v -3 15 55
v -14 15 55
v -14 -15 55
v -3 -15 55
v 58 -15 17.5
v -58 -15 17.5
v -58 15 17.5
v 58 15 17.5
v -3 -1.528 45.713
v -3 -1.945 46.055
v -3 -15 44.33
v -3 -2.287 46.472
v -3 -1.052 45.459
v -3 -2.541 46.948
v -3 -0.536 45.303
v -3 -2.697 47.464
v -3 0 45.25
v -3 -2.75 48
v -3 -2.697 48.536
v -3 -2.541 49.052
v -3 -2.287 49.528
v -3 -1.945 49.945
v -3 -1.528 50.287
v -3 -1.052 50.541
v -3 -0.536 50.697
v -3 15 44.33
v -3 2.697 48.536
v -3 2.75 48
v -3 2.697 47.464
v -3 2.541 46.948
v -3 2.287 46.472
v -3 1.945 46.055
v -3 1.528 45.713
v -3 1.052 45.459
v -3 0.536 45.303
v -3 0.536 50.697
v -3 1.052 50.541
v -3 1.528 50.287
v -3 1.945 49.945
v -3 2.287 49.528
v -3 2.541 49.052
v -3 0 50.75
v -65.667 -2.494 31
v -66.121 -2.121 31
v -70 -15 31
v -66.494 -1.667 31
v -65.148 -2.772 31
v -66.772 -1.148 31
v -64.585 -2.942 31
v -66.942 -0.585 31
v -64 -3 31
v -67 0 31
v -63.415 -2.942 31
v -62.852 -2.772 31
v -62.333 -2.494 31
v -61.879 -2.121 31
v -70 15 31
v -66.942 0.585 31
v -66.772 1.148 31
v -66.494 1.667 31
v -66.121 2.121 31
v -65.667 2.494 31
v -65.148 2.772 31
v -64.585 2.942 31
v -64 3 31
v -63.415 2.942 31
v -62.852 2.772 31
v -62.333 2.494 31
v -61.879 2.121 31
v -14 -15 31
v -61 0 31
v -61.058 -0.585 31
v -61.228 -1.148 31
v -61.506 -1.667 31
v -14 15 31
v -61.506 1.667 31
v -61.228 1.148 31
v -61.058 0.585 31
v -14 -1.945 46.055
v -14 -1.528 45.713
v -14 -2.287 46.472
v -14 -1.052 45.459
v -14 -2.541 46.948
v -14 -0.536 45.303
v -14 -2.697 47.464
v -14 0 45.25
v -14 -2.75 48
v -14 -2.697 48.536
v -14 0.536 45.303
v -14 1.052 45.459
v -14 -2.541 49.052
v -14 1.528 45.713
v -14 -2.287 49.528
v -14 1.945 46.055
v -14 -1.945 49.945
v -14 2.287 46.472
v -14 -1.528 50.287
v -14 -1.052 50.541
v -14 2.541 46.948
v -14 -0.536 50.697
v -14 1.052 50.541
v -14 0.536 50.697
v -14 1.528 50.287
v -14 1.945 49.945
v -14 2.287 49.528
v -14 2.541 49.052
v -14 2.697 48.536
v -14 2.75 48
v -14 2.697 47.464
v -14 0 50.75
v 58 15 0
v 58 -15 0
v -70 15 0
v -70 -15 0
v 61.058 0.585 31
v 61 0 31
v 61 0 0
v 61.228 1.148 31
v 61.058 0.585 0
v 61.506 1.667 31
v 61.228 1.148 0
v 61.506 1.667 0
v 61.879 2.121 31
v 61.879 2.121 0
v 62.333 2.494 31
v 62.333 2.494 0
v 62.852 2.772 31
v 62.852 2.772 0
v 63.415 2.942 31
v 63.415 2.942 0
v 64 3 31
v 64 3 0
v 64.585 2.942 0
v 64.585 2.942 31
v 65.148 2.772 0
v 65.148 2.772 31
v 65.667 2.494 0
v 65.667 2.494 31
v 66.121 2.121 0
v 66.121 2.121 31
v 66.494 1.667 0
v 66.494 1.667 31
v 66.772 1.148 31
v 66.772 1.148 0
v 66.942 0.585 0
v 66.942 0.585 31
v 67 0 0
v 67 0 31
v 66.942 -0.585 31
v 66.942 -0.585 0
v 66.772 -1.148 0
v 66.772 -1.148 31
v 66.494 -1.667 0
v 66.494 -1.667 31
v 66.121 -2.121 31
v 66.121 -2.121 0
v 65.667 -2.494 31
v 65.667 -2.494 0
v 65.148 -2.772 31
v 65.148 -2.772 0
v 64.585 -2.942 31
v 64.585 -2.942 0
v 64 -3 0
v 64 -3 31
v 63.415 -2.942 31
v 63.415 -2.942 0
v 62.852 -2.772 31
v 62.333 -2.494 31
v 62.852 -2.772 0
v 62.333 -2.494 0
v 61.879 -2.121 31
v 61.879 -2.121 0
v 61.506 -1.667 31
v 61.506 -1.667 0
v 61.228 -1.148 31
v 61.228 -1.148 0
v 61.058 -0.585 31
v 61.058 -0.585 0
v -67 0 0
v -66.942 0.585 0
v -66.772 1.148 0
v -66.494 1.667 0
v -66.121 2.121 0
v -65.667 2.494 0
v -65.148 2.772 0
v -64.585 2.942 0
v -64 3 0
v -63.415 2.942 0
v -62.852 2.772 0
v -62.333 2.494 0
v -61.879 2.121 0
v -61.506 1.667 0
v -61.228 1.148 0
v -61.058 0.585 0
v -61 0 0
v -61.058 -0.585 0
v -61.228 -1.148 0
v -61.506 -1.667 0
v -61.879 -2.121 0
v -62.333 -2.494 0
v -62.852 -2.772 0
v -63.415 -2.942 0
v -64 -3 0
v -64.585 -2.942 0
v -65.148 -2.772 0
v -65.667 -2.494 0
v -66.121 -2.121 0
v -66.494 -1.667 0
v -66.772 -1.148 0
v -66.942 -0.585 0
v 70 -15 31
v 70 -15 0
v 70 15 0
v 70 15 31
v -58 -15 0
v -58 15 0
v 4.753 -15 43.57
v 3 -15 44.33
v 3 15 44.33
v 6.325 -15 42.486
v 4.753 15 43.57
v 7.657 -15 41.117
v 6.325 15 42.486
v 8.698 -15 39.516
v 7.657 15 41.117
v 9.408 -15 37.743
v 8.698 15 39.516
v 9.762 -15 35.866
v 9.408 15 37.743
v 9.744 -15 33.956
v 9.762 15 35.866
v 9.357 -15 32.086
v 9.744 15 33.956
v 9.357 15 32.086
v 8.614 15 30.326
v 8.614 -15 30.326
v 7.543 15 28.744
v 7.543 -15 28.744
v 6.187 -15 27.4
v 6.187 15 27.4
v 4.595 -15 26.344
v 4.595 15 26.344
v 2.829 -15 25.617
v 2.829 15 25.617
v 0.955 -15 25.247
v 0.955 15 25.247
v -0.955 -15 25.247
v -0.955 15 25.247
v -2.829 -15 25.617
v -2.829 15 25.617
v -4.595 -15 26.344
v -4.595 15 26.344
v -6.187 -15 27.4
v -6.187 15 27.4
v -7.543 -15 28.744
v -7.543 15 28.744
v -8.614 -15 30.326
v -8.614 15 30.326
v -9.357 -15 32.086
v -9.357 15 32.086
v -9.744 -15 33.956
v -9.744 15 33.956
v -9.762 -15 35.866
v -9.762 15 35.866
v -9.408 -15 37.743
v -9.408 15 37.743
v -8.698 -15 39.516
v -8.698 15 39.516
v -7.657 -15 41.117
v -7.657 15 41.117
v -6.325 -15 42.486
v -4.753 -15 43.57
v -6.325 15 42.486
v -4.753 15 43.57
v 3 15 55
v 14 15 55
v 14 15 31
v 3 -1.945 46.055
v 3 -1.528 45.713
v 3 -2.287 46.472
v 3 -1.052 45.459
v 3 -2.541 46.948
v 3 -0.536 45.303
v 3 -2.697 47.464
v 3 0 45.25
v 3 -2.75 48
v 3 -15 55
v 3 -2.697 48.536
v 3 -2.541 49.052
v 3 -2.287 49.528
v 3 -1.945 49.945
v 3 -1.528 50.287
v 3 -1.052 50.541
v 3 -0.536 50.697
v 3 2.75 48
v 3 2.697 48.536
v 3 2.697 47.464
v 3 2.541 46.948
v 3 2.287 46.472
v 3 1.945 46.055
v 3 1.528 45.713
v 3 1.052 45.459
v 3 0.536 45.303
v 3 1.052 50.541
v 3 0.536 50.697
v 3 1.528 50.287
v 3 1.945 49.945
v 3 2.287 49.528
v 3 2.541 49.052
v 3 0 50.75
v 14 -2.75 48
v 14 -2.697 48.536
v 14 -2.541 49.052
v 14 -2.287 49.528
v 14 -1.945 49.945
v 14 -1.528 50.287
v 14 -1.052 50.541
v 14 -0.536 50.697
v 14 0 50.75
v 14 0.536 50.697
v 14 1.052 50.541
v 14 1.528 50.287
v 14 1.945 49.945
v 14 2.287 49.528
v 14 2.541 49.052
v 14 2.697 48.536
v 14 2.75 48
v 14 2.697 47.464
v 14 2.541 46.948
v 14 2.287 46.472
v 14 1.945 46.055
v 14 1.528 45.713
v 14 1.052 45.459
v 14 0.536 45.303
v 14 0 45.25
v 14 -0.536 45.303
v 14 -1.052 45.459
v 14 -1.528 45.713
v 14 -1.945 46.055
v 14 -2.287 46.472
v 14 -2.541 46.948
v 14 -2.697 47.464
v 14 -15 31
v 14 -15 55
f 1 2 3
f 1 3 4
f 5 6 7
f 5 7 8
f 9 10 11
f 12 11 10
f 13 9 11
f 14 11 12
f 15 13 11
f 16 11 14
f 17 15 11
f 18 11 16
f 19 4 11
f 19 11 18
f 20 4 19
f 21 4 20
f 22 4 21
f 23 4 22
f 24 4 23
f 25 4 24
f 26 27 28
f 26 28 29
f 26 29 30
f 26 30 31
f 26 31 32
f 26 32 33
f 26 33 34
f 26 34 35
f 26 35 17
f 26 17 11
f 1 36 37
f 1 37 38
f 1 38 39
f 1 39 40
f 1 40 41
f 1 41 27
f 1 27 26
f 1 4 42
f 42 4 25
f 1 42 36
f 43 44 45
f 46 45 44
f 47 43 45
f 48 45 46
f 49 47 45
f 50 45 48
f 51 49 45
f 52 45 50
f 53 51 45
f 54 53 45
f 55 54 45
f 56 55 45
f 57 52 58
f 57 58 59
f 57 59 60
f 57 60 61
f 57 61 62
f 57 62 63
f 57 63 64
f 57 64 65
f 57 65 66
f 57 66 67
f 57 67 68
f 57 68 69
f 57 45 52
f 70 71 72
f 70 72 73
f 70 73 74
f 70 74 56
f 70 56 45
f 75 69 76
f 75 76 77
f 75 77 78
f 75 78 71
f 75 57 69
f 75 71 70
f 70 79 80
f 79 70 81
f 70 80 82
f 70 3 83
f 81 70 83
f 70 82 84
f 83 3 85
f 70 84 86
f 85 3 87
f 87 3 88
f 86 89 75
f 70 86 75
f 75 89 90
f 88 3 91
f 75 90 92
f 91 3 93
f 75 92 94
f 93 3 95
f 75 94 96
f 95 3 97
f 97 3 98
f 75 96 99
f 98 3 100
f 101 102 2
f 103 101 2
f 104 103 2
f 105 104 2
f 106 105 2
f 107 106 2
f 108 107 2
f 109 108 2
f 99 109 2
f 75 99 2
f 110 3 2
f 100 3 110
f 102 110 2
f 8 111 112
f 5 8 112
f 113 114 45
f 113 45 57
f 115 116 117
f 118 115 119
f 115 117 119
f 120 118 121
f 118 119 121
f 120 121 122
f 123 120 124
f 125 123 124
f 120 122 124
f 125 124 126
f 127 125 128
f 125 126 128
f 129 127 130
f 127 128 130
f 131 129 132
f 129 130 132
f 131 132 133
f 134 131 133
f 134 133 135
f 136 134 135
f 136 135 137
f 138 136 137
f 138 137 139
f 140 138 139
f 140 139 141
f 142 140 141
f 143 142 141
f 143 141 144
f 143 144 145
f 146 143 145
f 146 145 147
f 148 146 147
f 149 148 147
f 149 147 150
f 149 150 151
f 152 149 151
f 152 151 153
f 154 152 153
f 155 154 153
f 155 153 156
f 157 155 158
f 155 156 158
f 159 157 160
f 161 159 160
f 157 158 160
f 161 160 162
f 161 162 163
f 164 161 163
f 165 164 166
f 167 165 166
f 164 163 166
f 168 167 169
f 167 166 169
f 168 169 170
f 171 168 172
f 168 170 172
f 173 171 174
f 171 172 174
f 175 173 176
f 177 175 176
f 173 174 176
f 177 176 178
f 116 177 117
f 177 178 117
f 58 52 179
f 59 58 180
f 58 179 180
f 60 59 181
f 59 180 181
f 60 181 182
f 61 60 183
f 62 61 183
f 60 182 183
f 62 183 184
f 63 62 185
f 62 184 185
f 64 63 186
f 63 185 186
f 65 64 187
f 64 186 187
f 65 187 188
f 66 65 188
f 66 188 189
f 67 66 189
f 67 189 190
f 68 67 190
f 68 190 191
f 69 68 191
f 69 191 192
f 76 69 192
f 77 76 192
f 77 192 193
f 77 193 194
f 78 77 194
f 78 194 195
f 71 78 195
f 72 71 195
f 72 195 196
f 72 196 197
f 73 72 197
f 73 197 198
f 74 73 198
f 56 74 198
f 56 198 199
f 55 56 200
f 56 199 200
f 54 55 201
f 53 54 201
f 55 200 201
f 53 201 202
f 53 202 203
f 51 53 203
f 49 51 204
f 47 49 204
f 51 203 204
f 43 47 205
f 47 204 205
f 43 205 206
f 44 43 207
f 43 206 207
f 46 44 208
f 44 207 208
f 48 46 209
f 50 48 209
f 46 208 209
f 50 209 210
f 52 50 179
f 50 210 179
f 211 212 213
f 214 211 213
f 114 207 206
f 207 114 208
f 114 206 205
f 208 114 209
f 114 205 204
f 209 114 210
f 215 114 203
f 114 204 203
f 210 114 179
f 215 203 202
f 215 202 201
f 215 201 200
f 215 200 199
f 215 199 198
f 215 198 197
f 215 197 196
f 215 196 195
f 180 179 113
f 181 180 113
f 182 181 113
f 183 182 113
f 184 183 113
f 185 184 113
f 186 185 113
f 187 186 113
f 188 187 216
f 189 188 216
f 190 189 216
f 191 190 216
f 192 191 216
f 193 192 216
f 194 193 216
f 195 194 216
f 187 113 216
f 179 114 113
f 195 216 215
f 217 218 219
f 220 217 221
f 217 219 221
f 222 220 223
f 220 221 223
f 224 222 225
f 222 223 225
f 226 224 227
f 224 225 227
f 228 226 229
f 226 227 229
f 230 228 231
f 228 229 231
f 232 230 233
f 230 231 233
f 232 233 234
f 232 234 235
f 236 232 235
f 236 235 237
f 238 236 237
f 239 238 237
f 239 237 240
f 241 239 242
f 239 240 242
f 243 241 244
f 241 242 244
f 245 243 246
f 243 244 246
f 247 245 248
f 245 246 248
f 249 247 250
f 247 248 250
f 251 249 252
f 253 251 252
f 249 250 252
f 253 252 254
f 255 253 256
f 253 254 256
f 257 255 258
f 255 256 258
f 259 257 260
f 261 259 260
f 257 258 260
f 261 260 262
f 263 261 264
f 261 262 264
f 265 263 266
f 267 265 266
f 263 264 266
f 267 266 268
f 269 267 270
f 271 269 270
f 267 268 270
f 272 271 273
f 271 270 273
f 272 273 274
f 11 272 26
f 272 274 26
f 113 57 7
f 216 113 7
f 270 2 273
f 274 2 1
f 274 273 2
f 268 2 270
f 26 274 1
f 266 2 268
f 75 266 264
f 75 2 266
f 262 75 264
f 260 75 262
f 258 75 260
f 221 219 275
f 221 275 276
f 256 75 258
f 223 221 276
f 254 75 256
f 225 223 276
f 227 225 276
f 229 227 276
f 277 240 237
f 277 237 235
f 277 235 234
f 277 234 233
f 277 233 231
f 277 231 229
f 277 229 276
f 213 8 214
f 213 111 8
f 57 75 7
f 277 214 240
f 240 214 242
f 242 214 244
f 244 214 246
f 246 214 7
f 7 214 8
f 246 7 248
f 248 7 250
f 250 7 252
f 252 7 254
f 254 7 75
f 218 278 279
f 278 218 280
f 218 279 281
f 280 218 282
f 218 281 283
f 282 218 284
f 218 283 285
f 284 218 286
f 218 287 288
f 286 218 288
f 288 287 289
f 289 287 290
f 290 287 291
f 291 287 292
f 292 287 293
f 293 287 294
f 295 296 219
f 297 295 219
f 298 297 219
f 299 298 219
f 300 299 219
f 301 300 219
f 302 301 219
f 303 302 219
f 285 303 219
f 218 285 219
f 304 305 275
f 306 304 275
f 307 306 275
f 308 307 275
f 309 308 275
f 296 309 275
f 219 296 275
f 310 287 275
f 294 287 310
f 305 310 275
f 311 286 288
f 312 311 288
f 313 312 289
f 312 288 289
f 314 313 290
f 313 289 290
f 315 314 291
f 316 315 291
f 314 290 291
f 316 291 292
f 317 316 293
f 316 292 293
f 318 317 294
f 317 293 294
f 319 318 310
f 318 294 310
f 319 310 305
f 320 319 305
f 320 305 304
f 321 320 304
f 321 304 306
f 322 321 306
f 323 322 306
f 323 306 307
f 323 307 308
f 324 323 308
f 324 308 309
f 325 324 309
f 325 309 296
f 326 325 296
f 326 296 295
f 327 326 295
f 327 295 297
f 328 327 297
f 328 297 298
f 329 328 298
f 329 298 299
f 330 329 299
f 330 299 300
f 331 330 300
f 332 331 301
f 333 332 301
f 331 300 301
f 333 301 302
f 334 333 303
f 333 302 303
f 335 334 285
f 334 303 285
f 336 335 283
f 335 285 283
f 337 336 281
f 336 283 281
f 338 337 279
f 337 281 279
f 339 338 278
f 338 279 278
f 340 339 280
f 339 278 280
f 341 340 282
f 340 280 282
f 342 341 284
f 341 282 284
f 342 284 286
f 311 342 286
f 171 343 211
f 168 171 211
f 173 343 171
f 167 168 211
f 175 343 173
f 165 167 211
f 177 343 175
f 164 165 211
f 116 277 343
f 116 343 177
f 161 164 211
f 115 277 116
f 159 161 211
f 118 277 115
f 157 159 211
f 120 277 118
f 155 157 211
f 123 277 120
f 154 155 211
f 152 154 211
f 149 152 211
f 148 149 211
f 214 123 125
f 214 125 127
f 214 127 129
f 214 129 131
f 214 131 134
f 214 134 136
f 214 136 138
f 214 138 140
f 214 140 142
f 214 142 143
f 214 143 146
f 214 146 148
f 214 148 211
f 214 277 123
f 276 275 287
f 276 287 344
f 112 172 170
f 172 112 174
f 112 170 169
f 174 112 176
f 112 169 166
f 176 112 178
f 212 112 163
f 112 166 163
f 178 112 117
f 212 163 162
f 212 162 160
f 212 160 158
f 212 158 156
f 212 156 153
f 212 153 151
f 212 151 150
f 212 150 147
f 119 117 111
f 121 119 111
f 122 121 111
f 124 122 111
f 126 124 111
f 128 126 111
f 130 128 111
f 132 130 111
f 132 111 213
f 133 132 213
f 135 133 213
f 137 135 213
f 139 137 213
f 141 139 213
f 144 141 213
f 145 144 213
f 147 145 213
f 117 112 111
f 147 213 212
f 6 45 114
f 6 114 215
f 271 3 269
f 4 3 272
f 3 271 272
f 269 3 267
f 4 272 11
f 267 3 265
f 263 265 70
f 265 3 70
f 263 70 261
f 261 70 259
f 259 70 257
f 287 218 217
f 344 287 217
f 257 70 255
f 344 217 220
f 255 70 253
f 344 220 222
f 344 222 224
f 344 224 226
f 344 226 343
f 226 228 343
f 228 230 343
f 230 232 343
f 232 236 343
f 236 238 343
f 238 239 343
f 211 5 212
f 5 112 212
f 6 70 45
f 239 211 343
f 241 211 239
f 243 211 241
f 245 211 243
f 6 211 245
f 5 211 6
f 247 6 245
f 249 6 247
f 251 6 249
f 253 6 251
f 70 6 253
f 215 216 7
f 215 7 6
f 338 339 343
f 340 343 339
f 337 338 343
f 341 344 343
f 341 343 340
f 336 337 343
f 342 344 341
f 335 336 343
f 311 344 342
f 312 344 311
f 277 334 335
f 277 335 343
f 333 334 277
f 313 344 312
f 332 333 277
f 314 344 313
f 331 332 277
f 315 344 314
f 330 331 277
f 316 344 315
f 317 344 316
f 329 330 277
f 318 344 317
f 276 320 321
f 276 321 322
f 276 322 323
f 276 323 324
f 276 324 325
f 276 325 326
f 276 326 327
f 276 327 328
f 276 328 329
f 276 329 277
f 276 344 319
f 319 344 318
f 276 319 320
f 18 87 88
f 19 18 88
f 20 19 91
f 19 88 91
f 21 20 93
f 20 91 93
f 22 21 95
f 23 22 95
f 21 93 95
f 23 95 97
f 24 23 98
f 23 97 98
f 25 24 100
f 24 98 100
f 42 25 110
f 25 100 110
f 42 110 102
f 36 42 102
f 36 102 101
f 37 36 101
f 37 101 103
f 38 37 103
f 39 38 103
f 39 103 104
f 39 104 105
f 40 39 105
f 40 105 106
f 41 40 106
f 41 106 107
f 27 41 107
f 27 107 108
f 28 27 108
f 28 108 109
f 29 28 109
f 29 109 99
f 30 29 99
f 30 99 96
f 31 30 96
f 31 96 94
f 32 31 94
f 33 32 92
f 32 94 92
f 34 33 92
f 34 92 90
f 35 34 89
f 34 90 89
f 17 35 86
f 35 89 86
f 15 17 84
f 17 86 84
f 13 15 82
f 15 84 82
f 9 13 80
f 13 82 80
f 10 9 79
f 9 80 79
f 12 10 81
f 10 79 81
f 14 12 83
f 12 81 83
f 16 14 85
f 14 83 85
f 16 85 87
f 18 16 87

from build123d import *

# Parameters (mm, degrees)
F0_W      = 140
F0_H      = 30
F1_DEPTH  = 55
F2_W      = 116
F2_H      = 30
F3_DEPTH  = 17.5
F5_D      = 19.6
F7_D      = 6
F9_D      = 6
F10_W     = 56
F10_H     = 30
F10_R     = 3
F11_DEPTH = 24
F12_W     = 56
F12_H     = 30
F12_R     = 3
F13_DEPTH = 24
F15_D     = 5.5
F16_W     = 6
F16_H     = 30.458071
F17_DEPTH = 25


with BuildPart() as f1:
    # F0 (on Top) → F1 (new body)
    with BuildSketch(Plane.XY):
        Rectangle(F0_W, F0_H)
    extrude(amount=F1_DEPTH)

    # F2 (on face) → F3 (cut)
    with BuildSketch(Plane(origin=(0, 0, 0), x_dir=(1, 0, 0), z_dir=(0, 0, -1))):
        Rectangle(F2_W, F2_H)
    extrude(amount=-F3_DEPTH, mode=Mode.SUBTRACT)

    # F5 (through all)
    with Locations(Plane.XZ.offset(15)):
        with Locations((0, 35)):
            Hole(F5_D / 2)

    # F7 (through all)
    with Locations(Plane.XY.offset(55)):
        with Locations((-64, 0)):
            Hole(F7_D / 2)

    # F9 (through all)
    with Locations(Plane.XY.offset(55)):
        with Locations((64, 0)):
            Hole(F9_D / 2)

    # F10 (on face) → F11 (cut)
    with BuildSketch(Plane.XY.offset(55)):
        with Locations((-42, 0)):
            Rectangle(F10_W, F10_H)
        with Locations((-64, 0)):
            Circle(F10_R, mode=Mode.SUBTRACT)
    extrude(amount=-F11_DEPTH, mode=Mode.SUBTRACT)

    # F12 (on face) → F13 (cut)
    with BuildSketch(Plane.XY.offset(55)):
        with Locations((42, 0)):
            Rectangle(F12_W, F12_H)
        with Locations((64, 0)):
            Circle(F12_R, mode=Mode.SUBTRACT)
    extrude(amount=-F13_DEPTH, mode=Mode.SUBTRACT)

    # F15 (through all)
    with Locations(Plane.YZ.offset(14)):
        with Locations((0, 48)):
            Hole(F15_D / 2)

    # F16 (on face) → F17 (cut)
    with BuildSketch(Plane.XY.offset(55)):
        with Locations((0, 0.21546)):
            Rectangle(F16_W, F16_H)
    extrude(amount=-F17_DEPTH, mode=Mode.SUBTRACT)


solid = f1.part
